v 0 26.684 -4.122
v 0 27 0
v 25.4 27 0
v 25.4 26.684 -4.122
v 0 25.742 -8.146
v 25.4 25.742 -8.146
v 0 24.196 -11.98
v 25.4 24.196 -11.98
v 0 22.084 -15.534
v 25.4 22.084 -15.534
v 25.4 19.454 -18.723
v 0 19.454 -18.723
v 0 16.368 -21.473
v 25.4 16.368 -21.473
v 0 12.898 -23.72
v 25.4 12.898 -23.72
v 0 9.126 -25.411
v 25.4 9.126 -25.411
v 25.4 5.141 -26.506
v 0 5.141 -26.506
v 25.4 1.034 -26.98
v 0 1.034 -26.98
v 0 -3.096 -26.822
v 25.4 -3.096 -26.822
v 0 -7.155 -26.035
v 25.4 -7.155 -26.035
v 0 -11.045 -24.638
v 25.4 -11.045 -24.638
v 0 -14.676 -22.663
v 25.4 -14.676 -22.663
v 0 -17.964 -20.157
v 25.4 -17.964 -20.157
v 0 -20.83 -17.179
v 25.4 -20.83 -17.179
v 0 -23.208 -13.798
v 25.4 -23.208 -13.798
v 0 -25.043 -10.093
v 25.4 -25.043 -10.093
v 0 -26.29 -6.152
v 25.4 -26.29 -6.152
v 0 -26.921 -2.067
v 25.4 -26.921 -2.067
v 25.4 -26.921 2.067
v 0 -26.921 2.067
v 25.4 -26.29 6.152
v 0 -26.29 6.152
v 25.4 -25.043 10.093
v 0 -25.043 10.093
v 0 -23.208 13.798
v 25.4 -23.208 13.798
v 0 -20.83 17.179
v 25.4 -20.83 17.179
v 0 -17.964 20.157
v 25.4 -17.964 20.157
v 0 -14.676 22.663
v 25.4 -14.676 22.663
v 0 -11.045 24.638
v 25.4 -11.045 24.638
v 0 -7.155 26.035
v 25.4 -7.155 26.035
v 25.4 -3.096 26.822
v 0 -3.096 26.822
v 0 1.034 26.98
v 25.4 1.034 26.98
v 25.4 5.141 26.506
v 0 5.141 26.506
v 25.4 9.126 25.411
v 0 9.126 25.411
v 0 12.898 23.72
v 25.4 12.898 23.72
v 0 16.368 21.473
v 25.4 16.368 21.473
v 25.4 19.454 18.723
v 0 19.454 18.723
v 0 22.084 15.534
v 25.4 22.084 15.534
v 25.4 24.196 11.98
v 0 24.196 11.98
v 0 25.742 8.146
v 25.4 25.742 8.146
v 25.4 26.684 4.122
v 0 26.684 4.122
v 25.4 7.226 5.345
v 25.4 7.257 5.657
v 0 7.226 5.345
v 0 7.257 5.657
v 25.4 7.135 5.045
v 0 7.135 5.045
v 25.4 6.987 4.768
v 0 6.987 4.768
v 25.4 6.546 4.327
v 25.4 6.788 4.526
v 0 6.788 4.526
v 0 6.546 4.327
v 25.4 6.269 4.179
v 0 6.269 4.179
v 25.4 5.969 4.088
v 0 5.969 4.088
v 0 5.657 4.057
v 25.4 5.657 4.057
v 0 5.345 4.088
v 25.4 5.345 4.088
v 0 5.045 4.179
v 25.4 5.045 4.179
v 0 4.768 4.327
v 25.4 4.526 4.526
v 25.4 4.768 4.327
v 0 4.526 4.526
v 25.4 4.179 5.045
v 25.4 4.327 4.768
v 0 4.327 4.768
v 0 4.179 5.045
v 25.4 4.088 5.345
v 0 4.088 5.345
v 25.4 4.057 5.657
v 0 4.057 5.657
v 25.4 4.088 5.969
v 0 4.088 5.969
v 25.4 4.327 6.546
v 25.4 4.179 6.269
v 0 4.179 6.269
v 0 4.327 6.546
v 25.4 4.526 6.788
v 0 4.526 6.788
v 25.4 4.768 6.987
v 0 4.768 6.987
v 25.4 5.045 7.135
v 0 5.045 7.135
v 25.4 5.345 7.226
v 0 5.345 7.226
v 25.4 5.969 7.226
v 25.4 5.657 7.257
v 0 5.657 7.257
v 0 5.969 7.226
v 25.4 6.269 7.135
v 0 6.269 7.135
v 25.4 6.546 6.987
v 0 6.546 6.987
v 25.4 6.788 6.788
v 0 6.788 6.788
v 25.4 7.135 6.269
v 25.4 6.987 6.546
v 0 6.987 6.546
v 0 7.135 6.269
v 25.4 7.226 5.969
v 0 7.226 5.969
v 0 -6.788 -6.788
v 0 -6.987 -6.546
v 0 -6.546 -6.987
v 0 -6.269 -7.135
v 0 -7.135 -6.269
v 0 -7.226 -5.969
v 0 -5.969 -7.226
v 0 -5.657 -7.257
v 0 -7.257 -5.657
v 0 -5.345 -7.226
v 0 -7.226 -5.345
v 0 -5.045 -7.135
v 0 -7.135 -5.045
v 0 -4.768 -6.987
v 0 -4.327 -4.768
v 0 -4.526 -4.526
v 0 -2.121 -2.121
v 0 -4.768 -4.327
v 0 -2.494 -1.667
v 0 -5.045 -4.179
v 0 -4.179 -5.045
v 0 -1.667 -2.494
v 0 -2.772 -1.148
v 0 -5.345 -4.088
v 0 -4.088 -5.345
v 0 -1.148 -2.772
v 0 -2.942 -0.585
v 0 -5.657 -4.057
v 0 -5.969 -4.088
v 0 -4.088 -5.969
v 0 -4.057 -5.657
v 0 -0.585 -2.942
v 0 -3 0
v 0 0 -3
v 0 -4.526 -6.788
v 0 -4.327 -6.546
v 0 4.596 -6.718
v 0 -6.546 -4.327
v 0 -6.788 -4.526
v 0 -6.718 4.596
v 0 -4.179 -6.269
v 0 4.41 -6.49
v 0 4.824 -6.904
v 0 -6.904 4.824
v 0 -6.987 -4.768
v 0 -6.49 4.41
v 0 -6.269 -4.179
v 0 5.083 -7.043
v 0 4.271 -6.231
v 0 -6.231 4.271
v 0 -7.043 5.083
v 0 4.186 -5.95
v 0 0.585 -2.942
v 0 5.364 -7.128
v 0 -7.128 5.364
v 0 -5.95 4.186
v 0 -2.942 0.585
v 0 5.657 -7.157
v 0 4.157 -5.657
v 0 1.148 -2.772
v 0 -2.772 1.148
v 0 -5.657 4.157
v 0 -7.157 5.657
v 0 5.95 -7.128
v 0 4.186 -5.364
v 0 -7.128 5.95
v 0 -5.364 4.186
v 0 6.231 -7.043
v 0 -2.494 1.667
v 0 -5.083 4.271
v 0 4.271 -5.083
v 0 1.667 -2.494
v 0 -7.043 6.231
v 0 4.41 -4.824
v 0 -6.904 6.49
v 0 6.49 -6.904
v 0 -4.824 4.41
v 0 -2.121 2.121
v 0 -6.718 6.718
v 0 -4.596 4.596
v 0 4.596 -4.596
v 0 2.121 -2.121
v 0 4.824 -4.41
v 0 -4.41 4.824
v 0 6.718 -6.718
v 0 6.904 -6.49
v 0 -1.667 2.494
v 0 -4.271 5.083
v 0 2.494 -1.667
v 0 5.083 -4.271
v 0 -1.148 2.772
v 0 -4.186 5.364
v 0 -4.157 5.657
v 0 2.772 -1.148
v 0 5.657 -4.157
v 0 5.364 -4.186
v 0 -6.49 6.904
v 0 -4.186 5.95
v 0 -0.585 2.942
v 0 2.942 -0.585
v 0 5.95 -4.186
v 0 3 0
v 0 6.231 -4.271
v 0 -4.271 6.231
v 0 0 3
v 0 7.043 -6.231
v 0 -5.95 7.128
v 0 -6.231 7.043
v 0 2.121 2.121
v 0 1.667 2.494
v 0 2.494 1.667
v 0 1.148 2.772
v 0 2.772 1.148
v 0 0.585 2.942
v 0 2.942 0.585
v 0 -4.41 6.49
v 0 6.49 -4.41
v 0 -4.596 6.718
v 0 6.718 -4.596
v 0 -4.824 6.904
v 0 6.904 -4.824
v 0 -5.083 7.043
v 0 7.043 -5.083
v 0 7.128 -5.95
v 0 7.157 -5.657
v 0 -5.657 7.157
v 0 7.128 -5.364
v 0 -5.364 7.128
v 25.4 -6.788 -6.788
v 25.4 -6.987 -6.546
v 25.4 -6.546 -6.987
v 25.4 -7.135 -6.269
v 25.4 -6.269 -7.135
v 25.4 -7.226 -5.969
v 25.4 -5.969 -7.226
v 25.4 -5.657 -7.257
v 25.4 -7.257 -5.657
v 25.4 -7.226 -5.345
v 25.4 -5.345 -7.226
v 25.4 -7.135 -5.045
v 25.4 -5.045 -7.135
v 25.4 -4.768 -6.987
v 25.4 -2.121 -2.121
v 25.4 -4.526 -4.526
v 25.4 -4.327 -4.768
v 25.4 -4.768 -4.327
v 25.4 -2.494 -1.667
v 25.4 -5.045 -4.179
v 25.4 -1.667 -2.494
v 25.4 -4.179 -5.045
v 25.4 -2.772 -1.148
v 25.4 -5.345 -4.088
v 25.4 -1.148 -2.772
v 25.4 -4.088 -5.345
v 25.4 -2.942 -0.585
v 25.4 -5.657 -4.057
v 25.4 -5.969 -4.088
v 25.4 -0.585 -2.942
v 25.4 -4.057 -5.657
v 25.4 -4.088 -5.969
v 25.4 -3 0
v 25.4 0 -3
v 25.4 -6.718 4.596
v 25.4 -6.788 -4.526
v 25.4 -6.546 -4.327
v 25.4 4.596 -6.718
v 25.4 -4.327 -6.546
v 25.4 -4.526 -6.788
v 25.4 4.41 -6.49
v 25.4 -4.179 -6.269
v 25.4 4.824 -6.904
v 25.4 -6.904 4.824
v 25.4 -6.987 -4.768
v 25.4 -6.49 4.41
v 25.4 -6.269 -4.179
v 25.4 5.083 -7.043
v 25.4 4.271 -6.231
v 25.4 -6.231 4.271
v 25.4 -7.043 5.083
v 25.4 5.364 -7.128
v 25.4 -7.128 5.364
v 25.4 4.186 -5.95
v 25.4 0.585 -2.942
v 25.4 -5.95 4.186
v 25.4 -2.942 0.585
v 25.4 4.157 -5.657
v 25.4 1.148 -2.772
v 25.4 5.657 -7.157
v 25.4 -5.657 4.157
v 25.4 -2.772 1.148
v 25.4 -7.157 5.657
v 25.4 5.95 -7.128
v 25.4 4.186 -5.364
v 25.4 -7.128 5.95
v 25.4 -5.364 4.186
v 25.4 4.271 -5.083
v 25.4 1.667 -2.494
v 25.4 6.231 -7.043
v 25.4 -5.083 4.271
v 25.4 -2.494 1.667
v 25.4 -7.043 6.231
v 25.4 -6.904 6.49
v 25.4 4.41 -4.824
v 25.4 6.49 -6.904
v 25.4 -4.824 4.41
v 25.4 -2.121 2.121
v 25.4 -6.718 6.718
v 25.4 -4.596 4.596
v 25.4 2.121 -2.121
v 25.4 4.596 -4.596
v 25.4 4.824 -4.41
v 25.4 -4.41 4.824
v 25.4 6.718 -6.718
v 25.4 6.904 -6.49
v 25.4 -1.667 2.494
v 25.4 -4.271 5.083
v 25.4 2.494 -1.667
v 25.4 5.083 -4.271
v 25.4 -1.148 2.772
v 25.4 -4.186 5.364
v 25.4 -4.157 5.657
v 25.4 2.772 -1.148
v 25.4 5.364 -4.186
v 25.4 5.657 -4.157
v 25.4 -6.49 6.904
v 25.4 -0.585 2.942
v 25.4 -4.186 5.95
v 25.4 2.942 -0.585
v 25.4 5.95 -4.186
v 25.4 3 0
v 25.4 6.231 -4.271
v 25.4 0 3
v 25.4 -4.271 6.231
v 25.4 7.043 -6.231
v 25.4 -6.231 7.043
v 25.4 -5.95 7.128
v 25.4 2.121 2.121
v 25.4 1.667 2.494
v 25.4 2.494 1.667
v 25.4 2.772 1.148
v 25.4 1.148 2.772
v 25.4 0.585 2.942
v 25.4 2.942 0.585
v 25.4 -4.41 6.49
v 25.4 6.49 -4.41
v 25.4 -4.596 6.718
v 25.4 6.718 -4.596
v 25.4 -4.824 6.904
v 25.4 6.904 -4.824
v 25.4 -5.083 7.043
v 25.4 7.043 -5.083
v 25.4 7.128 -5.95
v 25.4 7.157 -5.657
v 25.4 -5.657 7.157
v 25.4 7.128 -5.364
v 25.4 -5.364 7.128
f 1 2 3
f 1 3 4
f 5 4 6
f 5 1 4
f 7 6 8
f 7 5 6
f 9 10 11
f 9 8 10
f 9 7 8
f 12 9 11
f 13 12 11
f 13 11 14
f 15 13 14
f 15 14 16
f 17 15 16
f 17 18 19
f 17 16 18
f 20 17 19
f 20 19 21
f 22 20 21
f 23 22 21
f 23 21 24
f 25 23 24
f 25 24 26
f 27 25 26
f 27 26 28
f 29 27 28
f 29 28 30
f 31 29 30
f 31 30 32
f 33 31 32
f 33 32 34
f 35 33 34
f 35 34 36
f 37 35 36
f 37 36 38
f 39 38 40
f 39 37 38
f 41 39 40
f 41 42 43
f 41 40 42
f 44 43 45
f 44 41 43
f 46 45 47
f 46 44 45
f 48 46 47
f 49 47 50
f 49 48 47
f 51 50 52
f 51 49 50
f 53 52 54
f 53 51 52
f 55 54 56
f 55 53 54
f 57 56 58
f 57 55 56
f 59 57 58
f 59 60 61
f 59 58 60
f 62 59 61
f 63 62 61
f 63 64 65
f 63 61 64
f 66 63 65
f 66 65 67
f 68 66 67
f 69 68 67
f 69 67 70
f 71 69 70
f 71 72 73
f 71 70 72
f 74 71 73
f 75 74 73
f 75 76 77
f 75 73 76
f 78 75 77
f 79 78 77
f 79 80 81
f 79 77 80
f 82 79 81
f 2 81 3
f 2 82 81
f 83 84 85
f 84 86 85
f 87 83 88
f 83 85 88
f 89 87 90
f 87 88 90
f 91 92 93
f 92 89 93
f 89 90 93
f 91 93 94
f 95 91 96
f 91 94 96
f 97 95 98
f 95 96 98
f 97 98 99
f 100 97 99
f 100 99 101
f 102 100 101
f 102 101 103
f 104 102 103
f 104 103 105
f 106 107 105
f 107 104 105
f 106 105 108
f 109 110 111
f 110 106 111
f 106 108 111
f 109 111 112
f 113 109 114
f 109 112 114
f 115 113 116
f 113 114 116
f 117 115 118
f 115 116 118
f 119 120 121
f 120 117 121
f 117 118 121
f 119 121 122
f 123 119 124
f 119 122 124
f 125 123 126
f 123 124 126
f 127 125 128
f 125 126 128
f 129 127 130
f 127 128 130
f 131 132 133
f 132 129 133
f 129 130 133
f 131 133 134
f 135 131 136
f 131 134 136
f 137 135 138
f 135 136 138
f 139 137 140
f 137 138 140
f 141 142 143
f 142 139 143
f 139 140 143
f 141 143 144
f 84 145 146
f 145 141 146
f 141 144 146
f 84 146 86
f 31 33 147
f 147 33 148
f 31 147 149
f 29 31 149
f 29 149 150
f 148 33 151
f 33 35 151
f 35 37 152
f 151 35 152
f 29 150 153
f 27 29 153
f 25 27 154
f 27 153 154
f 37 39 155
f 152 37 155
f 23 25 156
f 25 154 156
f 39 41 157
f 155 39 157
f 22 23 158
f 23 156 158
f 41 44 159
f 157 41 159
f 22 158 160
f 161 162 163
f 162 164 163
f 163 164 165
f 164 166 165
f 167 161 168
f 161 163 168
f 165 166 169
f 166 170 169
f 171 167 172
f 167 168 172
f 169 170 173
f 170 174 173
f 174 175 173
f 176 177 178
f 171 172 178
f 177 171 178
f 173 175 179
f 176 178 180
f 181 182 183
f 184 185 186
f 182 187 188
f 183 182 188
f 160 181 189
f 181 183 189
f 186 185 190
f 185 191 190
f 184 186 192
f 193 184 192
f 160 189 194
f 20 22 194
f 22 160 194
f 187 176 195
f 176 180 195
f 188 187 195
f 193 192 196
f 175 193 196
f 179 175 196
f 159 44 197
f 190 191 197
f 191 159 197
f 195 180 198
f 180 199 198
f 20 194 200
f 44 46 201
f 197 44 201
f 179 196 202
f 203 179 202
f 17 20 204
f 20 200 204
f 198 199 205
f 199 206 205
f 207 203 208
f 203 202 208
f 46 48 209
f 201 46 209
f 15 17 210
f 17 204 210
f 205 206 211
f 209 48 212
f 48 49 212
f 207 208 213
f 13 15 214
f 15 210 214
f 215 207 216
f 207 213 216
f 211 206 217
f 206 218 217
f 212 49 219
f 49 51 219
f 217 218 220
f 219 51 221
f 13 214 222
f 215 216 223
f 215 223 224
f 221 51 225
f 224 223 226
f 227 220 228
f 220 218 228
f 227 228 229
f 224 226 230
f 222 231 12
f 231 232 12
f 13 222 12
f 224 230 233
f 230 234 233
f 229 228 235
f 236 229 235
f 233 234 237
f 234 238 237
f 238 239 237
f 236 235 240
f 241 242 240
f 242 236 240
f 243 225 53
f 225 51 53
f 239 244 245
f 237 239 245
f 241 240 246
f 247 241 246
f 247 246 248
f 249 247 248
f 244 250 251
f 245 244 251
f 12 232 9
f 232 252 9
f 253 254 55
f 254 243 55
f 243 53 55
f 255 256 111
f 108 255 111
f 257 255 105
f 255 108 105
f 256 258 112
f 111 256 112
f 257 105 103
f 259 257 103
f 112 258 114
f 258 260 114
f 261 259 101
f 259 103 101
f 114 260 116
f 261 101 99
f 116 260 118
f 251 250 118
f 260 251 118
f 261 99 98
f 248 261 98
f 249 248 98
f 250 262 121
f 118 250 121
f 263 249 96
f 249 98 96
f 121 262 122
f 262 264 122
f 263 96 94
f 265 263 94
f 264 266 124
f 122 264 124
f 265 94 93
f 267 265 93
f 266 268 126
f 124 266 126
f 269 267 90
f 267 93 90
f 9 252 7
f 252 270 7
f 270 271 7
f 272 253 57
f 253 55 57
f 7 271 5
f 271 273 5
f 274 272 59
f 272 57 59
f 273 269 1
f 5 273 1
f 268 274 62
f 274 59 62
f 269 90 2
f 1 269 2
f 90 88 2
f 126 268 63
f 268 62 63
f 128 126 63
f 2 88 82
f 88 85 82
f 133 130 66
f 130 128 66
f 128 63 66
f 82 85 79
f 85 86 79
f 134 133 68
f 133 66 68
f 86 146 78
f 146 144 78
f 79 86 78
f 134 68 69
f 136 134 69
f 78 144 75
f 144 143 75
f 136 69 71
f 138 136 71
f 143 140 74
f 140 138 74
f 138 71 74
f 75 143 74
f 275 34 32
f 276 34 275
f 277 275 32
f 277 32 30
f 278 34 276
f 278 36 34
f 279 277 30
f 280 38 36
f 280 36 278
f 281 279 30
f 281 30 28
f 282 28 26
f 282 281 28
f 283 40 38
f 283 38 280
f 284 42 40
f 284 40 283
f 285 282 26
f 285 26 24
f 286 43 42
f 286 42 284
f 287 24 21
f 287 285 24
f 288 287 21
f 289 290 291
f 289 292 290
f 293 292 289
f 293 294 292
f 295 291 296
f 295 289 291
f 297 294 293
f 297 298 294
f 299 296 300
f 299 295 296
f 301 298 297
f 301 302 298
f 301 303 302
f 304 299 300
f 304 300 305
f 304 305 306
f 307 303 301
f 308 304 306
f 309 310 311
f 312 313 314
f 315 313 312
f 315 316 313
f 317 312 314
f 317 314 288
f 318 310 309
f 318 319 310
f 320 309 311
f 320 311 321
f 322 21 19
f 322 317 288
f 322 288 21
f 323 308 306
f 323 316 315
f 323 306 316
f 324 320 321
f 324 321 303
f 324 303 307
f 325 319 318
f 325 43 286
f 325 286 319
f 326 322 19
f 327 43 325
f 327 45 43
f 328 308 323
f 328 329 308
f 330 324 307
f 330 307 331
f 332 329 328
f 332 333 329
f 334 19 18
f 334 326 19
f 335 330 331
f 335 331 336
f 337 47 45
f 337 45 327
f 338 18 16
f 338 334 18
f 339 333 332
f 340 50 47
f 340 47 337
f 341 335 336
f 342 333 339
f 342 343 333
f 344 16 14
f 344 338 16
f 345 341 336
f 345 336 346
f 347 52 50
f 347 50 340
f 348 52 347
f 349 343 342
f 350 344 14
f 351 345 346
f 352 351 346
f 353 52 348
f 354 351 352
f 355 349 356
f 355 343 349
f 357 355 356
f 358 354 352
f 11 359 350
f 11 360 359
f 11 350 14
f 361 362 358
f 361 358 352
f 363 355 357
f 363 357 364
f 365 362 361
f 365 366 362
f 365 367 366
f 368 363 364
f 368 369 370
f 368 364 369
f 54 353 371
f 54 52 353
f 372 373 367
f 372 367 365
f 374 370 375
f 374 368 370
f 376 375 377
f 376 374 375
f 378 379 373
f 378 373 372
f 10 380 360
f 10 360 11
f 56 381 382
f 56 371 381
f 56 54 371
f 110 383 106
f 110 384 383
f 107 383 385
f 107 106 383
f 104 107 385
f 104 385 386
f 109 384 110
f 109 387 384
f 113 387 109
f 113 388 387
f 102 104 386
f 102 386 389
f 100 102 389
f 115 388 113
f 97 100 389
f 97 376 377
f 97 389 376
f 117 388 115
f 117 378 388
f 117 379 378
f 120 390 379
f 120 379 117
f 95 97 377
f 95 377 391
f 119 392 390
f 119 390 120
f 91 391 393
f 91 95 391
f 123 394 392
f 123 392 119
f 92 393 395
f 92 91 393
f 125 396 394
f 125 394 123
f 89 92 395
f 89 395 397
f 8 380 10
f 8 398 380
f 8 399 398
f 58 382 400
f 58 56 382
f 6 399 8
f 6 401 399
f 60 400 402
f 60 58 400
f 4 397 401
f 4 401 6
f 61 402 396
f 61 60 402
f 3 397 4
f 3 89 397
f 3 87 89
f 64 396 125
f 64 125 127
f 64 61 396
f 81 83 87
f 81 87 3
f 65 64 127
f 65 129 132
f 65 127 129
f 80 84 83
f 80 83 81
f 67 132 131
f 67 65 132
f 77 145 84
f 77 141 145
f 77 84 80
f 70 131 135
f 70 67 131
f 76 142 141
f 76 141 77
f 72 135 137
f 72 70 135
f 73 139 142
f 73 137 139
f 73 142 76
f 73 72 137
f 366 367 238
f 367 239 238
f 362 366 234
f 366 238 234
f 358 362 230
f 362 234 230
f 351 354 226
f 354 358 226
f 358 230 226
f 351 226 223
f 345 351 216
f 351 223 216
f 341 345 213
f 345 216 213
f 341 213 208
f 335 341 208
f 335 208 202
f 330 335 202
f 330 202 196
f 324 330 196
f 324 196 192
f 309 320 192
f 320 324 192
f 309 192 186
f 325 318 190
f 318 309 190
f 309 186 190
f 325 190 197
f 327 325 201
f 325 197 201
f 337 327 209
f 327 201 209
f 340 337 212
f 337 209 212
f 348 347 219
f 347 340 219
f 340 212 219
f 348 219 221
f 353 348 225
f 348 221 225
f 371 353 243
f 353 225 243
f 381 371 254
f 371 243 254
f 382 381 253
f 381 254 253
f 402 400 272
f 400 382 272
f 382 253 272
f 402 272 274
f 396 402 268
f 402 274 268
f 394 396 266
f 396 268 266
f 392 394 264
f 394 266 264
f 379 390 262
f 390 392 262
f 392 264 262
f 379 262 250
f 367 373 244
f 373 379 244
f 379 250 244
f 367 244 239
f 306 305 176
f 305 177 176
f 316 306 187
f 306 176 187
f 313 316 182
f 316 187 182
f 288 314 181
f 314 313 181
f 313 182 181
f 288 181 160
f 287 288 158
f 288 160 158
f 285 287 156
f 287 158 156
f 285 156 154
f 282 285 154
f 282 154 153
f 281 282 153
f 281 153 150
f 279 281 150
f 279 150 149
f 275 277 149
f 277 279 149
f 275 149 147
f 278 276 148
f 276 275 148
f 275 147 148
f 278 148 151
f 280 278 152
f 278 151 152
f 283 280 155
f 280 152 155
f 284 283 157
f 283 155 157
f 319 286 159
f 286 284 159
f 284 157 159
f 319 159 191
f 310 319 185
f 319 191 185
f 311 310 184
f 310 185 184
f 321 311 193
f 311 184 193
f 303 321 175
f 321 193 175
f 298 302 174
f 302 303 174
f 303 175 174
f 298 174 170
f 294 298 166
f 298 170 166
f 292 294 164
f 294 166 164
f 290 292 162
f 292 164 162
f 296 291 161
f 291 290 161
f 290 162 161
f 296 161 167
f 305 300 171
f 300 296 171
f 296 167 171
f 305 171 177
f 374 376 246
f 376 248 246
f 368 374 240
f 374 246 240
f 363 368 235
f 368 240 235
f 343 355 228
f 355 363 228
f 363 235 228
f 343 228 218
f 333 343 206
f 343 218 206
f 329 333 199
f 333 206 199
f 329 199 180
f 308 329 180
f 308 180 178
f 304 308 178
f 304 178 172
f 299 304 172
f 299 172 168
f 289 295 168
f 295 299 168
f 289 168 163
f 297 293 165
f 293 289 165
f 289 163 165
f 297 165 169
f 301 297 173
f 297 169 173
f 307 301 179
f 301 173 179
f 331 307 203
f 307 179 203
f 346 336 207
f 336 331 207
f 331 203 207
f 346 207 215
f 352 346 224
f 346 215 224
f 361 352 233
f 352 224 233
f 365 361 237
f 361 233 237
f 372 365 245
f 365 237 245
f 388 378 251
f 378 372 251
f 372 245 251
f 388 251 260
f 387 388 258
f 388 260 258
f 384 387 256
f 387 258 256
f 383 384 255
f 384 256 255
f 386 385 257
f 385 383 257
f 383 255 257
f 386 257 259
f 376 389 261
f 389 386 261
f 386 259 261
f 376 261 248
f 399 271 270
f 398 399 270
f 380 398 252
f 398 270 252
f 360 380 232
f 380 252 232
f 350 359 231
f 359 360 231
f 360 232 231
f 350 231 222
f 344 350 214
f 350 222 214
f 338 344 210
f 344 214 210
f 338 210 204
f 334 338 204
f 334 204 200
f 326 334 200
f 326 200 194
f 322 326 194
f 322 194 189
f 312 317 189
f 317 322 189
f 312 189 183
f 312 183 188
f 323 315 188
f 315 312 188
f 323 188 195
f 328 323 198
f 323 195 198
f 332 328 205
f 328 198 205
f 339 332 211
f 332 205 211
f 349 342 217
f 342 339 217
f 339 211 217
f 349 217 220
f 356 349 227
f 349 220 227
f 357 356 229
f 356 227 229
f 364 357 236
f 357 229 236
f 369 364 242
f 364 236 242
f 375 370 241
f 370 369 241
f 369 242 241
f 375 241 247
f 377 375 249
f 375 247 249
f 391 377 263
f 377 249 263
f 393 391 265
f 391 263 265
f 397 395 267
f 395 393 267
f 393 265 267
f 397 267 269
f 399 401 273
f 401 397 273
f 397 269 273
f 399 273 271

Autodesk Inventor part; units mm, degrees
ref_plane "YZ Plane" through (0, 0, 0) normal (1, 0, 0) x (0, 1, 0)
ref_plane "XZ Plane" through (0, 0, 0) normal (0, 1, 0) x (-1, 0, 0)
ref_plane "XY Plane" through (0, 0, 0) normal (0, 0, 1) x (1, 0, 0)
sketch "Sketch1" plane through (0, 0, 0) normal (1, 0, 0) x (0, 1, 0)
  circle A0 centre (0, 0) radius 27
  circle A1 centre (0, 0) radius 8 construction
  line L0 (-8, 8) -> (8, 8) construction
  line L1 (8, 8) -> (8, -8) construction
  line L2 (8, -8) -> (-8, -8) construction
  line L3 (-8, -8) -> (-8, 8) construction
  line L4 (-8, 8) -> (8, -8) construction
  line L5 (8, 8) -> (-8, -8) construction
  circle A2 centre (5.6569, 5.6569) radius 1.6
  circle A3 centre (5.6569, -5.6569) radius 1.5
  circle A4 centre (-5.6569, -5.6569) radius 1.6
  circle A5 centre (-5.6569, 5.6569) radius 1.5
  circle A6 centre (0, 0) radius 3
  dimension "d0" = 54
  dimension "d1" = 16
  dimension "d2" = 3.2
  dimension "d3" = 3
  dimension "d4" = 3.2
  dimension "d5" = 3
  dimension "d6" = 6
  dimension "d7" = 16
  dimension "d8" = 16
extrude "Extrusion1" add sketch "Sketch1" along normal blind 25.4
properties part number "60mm_Grip_Wheel"
